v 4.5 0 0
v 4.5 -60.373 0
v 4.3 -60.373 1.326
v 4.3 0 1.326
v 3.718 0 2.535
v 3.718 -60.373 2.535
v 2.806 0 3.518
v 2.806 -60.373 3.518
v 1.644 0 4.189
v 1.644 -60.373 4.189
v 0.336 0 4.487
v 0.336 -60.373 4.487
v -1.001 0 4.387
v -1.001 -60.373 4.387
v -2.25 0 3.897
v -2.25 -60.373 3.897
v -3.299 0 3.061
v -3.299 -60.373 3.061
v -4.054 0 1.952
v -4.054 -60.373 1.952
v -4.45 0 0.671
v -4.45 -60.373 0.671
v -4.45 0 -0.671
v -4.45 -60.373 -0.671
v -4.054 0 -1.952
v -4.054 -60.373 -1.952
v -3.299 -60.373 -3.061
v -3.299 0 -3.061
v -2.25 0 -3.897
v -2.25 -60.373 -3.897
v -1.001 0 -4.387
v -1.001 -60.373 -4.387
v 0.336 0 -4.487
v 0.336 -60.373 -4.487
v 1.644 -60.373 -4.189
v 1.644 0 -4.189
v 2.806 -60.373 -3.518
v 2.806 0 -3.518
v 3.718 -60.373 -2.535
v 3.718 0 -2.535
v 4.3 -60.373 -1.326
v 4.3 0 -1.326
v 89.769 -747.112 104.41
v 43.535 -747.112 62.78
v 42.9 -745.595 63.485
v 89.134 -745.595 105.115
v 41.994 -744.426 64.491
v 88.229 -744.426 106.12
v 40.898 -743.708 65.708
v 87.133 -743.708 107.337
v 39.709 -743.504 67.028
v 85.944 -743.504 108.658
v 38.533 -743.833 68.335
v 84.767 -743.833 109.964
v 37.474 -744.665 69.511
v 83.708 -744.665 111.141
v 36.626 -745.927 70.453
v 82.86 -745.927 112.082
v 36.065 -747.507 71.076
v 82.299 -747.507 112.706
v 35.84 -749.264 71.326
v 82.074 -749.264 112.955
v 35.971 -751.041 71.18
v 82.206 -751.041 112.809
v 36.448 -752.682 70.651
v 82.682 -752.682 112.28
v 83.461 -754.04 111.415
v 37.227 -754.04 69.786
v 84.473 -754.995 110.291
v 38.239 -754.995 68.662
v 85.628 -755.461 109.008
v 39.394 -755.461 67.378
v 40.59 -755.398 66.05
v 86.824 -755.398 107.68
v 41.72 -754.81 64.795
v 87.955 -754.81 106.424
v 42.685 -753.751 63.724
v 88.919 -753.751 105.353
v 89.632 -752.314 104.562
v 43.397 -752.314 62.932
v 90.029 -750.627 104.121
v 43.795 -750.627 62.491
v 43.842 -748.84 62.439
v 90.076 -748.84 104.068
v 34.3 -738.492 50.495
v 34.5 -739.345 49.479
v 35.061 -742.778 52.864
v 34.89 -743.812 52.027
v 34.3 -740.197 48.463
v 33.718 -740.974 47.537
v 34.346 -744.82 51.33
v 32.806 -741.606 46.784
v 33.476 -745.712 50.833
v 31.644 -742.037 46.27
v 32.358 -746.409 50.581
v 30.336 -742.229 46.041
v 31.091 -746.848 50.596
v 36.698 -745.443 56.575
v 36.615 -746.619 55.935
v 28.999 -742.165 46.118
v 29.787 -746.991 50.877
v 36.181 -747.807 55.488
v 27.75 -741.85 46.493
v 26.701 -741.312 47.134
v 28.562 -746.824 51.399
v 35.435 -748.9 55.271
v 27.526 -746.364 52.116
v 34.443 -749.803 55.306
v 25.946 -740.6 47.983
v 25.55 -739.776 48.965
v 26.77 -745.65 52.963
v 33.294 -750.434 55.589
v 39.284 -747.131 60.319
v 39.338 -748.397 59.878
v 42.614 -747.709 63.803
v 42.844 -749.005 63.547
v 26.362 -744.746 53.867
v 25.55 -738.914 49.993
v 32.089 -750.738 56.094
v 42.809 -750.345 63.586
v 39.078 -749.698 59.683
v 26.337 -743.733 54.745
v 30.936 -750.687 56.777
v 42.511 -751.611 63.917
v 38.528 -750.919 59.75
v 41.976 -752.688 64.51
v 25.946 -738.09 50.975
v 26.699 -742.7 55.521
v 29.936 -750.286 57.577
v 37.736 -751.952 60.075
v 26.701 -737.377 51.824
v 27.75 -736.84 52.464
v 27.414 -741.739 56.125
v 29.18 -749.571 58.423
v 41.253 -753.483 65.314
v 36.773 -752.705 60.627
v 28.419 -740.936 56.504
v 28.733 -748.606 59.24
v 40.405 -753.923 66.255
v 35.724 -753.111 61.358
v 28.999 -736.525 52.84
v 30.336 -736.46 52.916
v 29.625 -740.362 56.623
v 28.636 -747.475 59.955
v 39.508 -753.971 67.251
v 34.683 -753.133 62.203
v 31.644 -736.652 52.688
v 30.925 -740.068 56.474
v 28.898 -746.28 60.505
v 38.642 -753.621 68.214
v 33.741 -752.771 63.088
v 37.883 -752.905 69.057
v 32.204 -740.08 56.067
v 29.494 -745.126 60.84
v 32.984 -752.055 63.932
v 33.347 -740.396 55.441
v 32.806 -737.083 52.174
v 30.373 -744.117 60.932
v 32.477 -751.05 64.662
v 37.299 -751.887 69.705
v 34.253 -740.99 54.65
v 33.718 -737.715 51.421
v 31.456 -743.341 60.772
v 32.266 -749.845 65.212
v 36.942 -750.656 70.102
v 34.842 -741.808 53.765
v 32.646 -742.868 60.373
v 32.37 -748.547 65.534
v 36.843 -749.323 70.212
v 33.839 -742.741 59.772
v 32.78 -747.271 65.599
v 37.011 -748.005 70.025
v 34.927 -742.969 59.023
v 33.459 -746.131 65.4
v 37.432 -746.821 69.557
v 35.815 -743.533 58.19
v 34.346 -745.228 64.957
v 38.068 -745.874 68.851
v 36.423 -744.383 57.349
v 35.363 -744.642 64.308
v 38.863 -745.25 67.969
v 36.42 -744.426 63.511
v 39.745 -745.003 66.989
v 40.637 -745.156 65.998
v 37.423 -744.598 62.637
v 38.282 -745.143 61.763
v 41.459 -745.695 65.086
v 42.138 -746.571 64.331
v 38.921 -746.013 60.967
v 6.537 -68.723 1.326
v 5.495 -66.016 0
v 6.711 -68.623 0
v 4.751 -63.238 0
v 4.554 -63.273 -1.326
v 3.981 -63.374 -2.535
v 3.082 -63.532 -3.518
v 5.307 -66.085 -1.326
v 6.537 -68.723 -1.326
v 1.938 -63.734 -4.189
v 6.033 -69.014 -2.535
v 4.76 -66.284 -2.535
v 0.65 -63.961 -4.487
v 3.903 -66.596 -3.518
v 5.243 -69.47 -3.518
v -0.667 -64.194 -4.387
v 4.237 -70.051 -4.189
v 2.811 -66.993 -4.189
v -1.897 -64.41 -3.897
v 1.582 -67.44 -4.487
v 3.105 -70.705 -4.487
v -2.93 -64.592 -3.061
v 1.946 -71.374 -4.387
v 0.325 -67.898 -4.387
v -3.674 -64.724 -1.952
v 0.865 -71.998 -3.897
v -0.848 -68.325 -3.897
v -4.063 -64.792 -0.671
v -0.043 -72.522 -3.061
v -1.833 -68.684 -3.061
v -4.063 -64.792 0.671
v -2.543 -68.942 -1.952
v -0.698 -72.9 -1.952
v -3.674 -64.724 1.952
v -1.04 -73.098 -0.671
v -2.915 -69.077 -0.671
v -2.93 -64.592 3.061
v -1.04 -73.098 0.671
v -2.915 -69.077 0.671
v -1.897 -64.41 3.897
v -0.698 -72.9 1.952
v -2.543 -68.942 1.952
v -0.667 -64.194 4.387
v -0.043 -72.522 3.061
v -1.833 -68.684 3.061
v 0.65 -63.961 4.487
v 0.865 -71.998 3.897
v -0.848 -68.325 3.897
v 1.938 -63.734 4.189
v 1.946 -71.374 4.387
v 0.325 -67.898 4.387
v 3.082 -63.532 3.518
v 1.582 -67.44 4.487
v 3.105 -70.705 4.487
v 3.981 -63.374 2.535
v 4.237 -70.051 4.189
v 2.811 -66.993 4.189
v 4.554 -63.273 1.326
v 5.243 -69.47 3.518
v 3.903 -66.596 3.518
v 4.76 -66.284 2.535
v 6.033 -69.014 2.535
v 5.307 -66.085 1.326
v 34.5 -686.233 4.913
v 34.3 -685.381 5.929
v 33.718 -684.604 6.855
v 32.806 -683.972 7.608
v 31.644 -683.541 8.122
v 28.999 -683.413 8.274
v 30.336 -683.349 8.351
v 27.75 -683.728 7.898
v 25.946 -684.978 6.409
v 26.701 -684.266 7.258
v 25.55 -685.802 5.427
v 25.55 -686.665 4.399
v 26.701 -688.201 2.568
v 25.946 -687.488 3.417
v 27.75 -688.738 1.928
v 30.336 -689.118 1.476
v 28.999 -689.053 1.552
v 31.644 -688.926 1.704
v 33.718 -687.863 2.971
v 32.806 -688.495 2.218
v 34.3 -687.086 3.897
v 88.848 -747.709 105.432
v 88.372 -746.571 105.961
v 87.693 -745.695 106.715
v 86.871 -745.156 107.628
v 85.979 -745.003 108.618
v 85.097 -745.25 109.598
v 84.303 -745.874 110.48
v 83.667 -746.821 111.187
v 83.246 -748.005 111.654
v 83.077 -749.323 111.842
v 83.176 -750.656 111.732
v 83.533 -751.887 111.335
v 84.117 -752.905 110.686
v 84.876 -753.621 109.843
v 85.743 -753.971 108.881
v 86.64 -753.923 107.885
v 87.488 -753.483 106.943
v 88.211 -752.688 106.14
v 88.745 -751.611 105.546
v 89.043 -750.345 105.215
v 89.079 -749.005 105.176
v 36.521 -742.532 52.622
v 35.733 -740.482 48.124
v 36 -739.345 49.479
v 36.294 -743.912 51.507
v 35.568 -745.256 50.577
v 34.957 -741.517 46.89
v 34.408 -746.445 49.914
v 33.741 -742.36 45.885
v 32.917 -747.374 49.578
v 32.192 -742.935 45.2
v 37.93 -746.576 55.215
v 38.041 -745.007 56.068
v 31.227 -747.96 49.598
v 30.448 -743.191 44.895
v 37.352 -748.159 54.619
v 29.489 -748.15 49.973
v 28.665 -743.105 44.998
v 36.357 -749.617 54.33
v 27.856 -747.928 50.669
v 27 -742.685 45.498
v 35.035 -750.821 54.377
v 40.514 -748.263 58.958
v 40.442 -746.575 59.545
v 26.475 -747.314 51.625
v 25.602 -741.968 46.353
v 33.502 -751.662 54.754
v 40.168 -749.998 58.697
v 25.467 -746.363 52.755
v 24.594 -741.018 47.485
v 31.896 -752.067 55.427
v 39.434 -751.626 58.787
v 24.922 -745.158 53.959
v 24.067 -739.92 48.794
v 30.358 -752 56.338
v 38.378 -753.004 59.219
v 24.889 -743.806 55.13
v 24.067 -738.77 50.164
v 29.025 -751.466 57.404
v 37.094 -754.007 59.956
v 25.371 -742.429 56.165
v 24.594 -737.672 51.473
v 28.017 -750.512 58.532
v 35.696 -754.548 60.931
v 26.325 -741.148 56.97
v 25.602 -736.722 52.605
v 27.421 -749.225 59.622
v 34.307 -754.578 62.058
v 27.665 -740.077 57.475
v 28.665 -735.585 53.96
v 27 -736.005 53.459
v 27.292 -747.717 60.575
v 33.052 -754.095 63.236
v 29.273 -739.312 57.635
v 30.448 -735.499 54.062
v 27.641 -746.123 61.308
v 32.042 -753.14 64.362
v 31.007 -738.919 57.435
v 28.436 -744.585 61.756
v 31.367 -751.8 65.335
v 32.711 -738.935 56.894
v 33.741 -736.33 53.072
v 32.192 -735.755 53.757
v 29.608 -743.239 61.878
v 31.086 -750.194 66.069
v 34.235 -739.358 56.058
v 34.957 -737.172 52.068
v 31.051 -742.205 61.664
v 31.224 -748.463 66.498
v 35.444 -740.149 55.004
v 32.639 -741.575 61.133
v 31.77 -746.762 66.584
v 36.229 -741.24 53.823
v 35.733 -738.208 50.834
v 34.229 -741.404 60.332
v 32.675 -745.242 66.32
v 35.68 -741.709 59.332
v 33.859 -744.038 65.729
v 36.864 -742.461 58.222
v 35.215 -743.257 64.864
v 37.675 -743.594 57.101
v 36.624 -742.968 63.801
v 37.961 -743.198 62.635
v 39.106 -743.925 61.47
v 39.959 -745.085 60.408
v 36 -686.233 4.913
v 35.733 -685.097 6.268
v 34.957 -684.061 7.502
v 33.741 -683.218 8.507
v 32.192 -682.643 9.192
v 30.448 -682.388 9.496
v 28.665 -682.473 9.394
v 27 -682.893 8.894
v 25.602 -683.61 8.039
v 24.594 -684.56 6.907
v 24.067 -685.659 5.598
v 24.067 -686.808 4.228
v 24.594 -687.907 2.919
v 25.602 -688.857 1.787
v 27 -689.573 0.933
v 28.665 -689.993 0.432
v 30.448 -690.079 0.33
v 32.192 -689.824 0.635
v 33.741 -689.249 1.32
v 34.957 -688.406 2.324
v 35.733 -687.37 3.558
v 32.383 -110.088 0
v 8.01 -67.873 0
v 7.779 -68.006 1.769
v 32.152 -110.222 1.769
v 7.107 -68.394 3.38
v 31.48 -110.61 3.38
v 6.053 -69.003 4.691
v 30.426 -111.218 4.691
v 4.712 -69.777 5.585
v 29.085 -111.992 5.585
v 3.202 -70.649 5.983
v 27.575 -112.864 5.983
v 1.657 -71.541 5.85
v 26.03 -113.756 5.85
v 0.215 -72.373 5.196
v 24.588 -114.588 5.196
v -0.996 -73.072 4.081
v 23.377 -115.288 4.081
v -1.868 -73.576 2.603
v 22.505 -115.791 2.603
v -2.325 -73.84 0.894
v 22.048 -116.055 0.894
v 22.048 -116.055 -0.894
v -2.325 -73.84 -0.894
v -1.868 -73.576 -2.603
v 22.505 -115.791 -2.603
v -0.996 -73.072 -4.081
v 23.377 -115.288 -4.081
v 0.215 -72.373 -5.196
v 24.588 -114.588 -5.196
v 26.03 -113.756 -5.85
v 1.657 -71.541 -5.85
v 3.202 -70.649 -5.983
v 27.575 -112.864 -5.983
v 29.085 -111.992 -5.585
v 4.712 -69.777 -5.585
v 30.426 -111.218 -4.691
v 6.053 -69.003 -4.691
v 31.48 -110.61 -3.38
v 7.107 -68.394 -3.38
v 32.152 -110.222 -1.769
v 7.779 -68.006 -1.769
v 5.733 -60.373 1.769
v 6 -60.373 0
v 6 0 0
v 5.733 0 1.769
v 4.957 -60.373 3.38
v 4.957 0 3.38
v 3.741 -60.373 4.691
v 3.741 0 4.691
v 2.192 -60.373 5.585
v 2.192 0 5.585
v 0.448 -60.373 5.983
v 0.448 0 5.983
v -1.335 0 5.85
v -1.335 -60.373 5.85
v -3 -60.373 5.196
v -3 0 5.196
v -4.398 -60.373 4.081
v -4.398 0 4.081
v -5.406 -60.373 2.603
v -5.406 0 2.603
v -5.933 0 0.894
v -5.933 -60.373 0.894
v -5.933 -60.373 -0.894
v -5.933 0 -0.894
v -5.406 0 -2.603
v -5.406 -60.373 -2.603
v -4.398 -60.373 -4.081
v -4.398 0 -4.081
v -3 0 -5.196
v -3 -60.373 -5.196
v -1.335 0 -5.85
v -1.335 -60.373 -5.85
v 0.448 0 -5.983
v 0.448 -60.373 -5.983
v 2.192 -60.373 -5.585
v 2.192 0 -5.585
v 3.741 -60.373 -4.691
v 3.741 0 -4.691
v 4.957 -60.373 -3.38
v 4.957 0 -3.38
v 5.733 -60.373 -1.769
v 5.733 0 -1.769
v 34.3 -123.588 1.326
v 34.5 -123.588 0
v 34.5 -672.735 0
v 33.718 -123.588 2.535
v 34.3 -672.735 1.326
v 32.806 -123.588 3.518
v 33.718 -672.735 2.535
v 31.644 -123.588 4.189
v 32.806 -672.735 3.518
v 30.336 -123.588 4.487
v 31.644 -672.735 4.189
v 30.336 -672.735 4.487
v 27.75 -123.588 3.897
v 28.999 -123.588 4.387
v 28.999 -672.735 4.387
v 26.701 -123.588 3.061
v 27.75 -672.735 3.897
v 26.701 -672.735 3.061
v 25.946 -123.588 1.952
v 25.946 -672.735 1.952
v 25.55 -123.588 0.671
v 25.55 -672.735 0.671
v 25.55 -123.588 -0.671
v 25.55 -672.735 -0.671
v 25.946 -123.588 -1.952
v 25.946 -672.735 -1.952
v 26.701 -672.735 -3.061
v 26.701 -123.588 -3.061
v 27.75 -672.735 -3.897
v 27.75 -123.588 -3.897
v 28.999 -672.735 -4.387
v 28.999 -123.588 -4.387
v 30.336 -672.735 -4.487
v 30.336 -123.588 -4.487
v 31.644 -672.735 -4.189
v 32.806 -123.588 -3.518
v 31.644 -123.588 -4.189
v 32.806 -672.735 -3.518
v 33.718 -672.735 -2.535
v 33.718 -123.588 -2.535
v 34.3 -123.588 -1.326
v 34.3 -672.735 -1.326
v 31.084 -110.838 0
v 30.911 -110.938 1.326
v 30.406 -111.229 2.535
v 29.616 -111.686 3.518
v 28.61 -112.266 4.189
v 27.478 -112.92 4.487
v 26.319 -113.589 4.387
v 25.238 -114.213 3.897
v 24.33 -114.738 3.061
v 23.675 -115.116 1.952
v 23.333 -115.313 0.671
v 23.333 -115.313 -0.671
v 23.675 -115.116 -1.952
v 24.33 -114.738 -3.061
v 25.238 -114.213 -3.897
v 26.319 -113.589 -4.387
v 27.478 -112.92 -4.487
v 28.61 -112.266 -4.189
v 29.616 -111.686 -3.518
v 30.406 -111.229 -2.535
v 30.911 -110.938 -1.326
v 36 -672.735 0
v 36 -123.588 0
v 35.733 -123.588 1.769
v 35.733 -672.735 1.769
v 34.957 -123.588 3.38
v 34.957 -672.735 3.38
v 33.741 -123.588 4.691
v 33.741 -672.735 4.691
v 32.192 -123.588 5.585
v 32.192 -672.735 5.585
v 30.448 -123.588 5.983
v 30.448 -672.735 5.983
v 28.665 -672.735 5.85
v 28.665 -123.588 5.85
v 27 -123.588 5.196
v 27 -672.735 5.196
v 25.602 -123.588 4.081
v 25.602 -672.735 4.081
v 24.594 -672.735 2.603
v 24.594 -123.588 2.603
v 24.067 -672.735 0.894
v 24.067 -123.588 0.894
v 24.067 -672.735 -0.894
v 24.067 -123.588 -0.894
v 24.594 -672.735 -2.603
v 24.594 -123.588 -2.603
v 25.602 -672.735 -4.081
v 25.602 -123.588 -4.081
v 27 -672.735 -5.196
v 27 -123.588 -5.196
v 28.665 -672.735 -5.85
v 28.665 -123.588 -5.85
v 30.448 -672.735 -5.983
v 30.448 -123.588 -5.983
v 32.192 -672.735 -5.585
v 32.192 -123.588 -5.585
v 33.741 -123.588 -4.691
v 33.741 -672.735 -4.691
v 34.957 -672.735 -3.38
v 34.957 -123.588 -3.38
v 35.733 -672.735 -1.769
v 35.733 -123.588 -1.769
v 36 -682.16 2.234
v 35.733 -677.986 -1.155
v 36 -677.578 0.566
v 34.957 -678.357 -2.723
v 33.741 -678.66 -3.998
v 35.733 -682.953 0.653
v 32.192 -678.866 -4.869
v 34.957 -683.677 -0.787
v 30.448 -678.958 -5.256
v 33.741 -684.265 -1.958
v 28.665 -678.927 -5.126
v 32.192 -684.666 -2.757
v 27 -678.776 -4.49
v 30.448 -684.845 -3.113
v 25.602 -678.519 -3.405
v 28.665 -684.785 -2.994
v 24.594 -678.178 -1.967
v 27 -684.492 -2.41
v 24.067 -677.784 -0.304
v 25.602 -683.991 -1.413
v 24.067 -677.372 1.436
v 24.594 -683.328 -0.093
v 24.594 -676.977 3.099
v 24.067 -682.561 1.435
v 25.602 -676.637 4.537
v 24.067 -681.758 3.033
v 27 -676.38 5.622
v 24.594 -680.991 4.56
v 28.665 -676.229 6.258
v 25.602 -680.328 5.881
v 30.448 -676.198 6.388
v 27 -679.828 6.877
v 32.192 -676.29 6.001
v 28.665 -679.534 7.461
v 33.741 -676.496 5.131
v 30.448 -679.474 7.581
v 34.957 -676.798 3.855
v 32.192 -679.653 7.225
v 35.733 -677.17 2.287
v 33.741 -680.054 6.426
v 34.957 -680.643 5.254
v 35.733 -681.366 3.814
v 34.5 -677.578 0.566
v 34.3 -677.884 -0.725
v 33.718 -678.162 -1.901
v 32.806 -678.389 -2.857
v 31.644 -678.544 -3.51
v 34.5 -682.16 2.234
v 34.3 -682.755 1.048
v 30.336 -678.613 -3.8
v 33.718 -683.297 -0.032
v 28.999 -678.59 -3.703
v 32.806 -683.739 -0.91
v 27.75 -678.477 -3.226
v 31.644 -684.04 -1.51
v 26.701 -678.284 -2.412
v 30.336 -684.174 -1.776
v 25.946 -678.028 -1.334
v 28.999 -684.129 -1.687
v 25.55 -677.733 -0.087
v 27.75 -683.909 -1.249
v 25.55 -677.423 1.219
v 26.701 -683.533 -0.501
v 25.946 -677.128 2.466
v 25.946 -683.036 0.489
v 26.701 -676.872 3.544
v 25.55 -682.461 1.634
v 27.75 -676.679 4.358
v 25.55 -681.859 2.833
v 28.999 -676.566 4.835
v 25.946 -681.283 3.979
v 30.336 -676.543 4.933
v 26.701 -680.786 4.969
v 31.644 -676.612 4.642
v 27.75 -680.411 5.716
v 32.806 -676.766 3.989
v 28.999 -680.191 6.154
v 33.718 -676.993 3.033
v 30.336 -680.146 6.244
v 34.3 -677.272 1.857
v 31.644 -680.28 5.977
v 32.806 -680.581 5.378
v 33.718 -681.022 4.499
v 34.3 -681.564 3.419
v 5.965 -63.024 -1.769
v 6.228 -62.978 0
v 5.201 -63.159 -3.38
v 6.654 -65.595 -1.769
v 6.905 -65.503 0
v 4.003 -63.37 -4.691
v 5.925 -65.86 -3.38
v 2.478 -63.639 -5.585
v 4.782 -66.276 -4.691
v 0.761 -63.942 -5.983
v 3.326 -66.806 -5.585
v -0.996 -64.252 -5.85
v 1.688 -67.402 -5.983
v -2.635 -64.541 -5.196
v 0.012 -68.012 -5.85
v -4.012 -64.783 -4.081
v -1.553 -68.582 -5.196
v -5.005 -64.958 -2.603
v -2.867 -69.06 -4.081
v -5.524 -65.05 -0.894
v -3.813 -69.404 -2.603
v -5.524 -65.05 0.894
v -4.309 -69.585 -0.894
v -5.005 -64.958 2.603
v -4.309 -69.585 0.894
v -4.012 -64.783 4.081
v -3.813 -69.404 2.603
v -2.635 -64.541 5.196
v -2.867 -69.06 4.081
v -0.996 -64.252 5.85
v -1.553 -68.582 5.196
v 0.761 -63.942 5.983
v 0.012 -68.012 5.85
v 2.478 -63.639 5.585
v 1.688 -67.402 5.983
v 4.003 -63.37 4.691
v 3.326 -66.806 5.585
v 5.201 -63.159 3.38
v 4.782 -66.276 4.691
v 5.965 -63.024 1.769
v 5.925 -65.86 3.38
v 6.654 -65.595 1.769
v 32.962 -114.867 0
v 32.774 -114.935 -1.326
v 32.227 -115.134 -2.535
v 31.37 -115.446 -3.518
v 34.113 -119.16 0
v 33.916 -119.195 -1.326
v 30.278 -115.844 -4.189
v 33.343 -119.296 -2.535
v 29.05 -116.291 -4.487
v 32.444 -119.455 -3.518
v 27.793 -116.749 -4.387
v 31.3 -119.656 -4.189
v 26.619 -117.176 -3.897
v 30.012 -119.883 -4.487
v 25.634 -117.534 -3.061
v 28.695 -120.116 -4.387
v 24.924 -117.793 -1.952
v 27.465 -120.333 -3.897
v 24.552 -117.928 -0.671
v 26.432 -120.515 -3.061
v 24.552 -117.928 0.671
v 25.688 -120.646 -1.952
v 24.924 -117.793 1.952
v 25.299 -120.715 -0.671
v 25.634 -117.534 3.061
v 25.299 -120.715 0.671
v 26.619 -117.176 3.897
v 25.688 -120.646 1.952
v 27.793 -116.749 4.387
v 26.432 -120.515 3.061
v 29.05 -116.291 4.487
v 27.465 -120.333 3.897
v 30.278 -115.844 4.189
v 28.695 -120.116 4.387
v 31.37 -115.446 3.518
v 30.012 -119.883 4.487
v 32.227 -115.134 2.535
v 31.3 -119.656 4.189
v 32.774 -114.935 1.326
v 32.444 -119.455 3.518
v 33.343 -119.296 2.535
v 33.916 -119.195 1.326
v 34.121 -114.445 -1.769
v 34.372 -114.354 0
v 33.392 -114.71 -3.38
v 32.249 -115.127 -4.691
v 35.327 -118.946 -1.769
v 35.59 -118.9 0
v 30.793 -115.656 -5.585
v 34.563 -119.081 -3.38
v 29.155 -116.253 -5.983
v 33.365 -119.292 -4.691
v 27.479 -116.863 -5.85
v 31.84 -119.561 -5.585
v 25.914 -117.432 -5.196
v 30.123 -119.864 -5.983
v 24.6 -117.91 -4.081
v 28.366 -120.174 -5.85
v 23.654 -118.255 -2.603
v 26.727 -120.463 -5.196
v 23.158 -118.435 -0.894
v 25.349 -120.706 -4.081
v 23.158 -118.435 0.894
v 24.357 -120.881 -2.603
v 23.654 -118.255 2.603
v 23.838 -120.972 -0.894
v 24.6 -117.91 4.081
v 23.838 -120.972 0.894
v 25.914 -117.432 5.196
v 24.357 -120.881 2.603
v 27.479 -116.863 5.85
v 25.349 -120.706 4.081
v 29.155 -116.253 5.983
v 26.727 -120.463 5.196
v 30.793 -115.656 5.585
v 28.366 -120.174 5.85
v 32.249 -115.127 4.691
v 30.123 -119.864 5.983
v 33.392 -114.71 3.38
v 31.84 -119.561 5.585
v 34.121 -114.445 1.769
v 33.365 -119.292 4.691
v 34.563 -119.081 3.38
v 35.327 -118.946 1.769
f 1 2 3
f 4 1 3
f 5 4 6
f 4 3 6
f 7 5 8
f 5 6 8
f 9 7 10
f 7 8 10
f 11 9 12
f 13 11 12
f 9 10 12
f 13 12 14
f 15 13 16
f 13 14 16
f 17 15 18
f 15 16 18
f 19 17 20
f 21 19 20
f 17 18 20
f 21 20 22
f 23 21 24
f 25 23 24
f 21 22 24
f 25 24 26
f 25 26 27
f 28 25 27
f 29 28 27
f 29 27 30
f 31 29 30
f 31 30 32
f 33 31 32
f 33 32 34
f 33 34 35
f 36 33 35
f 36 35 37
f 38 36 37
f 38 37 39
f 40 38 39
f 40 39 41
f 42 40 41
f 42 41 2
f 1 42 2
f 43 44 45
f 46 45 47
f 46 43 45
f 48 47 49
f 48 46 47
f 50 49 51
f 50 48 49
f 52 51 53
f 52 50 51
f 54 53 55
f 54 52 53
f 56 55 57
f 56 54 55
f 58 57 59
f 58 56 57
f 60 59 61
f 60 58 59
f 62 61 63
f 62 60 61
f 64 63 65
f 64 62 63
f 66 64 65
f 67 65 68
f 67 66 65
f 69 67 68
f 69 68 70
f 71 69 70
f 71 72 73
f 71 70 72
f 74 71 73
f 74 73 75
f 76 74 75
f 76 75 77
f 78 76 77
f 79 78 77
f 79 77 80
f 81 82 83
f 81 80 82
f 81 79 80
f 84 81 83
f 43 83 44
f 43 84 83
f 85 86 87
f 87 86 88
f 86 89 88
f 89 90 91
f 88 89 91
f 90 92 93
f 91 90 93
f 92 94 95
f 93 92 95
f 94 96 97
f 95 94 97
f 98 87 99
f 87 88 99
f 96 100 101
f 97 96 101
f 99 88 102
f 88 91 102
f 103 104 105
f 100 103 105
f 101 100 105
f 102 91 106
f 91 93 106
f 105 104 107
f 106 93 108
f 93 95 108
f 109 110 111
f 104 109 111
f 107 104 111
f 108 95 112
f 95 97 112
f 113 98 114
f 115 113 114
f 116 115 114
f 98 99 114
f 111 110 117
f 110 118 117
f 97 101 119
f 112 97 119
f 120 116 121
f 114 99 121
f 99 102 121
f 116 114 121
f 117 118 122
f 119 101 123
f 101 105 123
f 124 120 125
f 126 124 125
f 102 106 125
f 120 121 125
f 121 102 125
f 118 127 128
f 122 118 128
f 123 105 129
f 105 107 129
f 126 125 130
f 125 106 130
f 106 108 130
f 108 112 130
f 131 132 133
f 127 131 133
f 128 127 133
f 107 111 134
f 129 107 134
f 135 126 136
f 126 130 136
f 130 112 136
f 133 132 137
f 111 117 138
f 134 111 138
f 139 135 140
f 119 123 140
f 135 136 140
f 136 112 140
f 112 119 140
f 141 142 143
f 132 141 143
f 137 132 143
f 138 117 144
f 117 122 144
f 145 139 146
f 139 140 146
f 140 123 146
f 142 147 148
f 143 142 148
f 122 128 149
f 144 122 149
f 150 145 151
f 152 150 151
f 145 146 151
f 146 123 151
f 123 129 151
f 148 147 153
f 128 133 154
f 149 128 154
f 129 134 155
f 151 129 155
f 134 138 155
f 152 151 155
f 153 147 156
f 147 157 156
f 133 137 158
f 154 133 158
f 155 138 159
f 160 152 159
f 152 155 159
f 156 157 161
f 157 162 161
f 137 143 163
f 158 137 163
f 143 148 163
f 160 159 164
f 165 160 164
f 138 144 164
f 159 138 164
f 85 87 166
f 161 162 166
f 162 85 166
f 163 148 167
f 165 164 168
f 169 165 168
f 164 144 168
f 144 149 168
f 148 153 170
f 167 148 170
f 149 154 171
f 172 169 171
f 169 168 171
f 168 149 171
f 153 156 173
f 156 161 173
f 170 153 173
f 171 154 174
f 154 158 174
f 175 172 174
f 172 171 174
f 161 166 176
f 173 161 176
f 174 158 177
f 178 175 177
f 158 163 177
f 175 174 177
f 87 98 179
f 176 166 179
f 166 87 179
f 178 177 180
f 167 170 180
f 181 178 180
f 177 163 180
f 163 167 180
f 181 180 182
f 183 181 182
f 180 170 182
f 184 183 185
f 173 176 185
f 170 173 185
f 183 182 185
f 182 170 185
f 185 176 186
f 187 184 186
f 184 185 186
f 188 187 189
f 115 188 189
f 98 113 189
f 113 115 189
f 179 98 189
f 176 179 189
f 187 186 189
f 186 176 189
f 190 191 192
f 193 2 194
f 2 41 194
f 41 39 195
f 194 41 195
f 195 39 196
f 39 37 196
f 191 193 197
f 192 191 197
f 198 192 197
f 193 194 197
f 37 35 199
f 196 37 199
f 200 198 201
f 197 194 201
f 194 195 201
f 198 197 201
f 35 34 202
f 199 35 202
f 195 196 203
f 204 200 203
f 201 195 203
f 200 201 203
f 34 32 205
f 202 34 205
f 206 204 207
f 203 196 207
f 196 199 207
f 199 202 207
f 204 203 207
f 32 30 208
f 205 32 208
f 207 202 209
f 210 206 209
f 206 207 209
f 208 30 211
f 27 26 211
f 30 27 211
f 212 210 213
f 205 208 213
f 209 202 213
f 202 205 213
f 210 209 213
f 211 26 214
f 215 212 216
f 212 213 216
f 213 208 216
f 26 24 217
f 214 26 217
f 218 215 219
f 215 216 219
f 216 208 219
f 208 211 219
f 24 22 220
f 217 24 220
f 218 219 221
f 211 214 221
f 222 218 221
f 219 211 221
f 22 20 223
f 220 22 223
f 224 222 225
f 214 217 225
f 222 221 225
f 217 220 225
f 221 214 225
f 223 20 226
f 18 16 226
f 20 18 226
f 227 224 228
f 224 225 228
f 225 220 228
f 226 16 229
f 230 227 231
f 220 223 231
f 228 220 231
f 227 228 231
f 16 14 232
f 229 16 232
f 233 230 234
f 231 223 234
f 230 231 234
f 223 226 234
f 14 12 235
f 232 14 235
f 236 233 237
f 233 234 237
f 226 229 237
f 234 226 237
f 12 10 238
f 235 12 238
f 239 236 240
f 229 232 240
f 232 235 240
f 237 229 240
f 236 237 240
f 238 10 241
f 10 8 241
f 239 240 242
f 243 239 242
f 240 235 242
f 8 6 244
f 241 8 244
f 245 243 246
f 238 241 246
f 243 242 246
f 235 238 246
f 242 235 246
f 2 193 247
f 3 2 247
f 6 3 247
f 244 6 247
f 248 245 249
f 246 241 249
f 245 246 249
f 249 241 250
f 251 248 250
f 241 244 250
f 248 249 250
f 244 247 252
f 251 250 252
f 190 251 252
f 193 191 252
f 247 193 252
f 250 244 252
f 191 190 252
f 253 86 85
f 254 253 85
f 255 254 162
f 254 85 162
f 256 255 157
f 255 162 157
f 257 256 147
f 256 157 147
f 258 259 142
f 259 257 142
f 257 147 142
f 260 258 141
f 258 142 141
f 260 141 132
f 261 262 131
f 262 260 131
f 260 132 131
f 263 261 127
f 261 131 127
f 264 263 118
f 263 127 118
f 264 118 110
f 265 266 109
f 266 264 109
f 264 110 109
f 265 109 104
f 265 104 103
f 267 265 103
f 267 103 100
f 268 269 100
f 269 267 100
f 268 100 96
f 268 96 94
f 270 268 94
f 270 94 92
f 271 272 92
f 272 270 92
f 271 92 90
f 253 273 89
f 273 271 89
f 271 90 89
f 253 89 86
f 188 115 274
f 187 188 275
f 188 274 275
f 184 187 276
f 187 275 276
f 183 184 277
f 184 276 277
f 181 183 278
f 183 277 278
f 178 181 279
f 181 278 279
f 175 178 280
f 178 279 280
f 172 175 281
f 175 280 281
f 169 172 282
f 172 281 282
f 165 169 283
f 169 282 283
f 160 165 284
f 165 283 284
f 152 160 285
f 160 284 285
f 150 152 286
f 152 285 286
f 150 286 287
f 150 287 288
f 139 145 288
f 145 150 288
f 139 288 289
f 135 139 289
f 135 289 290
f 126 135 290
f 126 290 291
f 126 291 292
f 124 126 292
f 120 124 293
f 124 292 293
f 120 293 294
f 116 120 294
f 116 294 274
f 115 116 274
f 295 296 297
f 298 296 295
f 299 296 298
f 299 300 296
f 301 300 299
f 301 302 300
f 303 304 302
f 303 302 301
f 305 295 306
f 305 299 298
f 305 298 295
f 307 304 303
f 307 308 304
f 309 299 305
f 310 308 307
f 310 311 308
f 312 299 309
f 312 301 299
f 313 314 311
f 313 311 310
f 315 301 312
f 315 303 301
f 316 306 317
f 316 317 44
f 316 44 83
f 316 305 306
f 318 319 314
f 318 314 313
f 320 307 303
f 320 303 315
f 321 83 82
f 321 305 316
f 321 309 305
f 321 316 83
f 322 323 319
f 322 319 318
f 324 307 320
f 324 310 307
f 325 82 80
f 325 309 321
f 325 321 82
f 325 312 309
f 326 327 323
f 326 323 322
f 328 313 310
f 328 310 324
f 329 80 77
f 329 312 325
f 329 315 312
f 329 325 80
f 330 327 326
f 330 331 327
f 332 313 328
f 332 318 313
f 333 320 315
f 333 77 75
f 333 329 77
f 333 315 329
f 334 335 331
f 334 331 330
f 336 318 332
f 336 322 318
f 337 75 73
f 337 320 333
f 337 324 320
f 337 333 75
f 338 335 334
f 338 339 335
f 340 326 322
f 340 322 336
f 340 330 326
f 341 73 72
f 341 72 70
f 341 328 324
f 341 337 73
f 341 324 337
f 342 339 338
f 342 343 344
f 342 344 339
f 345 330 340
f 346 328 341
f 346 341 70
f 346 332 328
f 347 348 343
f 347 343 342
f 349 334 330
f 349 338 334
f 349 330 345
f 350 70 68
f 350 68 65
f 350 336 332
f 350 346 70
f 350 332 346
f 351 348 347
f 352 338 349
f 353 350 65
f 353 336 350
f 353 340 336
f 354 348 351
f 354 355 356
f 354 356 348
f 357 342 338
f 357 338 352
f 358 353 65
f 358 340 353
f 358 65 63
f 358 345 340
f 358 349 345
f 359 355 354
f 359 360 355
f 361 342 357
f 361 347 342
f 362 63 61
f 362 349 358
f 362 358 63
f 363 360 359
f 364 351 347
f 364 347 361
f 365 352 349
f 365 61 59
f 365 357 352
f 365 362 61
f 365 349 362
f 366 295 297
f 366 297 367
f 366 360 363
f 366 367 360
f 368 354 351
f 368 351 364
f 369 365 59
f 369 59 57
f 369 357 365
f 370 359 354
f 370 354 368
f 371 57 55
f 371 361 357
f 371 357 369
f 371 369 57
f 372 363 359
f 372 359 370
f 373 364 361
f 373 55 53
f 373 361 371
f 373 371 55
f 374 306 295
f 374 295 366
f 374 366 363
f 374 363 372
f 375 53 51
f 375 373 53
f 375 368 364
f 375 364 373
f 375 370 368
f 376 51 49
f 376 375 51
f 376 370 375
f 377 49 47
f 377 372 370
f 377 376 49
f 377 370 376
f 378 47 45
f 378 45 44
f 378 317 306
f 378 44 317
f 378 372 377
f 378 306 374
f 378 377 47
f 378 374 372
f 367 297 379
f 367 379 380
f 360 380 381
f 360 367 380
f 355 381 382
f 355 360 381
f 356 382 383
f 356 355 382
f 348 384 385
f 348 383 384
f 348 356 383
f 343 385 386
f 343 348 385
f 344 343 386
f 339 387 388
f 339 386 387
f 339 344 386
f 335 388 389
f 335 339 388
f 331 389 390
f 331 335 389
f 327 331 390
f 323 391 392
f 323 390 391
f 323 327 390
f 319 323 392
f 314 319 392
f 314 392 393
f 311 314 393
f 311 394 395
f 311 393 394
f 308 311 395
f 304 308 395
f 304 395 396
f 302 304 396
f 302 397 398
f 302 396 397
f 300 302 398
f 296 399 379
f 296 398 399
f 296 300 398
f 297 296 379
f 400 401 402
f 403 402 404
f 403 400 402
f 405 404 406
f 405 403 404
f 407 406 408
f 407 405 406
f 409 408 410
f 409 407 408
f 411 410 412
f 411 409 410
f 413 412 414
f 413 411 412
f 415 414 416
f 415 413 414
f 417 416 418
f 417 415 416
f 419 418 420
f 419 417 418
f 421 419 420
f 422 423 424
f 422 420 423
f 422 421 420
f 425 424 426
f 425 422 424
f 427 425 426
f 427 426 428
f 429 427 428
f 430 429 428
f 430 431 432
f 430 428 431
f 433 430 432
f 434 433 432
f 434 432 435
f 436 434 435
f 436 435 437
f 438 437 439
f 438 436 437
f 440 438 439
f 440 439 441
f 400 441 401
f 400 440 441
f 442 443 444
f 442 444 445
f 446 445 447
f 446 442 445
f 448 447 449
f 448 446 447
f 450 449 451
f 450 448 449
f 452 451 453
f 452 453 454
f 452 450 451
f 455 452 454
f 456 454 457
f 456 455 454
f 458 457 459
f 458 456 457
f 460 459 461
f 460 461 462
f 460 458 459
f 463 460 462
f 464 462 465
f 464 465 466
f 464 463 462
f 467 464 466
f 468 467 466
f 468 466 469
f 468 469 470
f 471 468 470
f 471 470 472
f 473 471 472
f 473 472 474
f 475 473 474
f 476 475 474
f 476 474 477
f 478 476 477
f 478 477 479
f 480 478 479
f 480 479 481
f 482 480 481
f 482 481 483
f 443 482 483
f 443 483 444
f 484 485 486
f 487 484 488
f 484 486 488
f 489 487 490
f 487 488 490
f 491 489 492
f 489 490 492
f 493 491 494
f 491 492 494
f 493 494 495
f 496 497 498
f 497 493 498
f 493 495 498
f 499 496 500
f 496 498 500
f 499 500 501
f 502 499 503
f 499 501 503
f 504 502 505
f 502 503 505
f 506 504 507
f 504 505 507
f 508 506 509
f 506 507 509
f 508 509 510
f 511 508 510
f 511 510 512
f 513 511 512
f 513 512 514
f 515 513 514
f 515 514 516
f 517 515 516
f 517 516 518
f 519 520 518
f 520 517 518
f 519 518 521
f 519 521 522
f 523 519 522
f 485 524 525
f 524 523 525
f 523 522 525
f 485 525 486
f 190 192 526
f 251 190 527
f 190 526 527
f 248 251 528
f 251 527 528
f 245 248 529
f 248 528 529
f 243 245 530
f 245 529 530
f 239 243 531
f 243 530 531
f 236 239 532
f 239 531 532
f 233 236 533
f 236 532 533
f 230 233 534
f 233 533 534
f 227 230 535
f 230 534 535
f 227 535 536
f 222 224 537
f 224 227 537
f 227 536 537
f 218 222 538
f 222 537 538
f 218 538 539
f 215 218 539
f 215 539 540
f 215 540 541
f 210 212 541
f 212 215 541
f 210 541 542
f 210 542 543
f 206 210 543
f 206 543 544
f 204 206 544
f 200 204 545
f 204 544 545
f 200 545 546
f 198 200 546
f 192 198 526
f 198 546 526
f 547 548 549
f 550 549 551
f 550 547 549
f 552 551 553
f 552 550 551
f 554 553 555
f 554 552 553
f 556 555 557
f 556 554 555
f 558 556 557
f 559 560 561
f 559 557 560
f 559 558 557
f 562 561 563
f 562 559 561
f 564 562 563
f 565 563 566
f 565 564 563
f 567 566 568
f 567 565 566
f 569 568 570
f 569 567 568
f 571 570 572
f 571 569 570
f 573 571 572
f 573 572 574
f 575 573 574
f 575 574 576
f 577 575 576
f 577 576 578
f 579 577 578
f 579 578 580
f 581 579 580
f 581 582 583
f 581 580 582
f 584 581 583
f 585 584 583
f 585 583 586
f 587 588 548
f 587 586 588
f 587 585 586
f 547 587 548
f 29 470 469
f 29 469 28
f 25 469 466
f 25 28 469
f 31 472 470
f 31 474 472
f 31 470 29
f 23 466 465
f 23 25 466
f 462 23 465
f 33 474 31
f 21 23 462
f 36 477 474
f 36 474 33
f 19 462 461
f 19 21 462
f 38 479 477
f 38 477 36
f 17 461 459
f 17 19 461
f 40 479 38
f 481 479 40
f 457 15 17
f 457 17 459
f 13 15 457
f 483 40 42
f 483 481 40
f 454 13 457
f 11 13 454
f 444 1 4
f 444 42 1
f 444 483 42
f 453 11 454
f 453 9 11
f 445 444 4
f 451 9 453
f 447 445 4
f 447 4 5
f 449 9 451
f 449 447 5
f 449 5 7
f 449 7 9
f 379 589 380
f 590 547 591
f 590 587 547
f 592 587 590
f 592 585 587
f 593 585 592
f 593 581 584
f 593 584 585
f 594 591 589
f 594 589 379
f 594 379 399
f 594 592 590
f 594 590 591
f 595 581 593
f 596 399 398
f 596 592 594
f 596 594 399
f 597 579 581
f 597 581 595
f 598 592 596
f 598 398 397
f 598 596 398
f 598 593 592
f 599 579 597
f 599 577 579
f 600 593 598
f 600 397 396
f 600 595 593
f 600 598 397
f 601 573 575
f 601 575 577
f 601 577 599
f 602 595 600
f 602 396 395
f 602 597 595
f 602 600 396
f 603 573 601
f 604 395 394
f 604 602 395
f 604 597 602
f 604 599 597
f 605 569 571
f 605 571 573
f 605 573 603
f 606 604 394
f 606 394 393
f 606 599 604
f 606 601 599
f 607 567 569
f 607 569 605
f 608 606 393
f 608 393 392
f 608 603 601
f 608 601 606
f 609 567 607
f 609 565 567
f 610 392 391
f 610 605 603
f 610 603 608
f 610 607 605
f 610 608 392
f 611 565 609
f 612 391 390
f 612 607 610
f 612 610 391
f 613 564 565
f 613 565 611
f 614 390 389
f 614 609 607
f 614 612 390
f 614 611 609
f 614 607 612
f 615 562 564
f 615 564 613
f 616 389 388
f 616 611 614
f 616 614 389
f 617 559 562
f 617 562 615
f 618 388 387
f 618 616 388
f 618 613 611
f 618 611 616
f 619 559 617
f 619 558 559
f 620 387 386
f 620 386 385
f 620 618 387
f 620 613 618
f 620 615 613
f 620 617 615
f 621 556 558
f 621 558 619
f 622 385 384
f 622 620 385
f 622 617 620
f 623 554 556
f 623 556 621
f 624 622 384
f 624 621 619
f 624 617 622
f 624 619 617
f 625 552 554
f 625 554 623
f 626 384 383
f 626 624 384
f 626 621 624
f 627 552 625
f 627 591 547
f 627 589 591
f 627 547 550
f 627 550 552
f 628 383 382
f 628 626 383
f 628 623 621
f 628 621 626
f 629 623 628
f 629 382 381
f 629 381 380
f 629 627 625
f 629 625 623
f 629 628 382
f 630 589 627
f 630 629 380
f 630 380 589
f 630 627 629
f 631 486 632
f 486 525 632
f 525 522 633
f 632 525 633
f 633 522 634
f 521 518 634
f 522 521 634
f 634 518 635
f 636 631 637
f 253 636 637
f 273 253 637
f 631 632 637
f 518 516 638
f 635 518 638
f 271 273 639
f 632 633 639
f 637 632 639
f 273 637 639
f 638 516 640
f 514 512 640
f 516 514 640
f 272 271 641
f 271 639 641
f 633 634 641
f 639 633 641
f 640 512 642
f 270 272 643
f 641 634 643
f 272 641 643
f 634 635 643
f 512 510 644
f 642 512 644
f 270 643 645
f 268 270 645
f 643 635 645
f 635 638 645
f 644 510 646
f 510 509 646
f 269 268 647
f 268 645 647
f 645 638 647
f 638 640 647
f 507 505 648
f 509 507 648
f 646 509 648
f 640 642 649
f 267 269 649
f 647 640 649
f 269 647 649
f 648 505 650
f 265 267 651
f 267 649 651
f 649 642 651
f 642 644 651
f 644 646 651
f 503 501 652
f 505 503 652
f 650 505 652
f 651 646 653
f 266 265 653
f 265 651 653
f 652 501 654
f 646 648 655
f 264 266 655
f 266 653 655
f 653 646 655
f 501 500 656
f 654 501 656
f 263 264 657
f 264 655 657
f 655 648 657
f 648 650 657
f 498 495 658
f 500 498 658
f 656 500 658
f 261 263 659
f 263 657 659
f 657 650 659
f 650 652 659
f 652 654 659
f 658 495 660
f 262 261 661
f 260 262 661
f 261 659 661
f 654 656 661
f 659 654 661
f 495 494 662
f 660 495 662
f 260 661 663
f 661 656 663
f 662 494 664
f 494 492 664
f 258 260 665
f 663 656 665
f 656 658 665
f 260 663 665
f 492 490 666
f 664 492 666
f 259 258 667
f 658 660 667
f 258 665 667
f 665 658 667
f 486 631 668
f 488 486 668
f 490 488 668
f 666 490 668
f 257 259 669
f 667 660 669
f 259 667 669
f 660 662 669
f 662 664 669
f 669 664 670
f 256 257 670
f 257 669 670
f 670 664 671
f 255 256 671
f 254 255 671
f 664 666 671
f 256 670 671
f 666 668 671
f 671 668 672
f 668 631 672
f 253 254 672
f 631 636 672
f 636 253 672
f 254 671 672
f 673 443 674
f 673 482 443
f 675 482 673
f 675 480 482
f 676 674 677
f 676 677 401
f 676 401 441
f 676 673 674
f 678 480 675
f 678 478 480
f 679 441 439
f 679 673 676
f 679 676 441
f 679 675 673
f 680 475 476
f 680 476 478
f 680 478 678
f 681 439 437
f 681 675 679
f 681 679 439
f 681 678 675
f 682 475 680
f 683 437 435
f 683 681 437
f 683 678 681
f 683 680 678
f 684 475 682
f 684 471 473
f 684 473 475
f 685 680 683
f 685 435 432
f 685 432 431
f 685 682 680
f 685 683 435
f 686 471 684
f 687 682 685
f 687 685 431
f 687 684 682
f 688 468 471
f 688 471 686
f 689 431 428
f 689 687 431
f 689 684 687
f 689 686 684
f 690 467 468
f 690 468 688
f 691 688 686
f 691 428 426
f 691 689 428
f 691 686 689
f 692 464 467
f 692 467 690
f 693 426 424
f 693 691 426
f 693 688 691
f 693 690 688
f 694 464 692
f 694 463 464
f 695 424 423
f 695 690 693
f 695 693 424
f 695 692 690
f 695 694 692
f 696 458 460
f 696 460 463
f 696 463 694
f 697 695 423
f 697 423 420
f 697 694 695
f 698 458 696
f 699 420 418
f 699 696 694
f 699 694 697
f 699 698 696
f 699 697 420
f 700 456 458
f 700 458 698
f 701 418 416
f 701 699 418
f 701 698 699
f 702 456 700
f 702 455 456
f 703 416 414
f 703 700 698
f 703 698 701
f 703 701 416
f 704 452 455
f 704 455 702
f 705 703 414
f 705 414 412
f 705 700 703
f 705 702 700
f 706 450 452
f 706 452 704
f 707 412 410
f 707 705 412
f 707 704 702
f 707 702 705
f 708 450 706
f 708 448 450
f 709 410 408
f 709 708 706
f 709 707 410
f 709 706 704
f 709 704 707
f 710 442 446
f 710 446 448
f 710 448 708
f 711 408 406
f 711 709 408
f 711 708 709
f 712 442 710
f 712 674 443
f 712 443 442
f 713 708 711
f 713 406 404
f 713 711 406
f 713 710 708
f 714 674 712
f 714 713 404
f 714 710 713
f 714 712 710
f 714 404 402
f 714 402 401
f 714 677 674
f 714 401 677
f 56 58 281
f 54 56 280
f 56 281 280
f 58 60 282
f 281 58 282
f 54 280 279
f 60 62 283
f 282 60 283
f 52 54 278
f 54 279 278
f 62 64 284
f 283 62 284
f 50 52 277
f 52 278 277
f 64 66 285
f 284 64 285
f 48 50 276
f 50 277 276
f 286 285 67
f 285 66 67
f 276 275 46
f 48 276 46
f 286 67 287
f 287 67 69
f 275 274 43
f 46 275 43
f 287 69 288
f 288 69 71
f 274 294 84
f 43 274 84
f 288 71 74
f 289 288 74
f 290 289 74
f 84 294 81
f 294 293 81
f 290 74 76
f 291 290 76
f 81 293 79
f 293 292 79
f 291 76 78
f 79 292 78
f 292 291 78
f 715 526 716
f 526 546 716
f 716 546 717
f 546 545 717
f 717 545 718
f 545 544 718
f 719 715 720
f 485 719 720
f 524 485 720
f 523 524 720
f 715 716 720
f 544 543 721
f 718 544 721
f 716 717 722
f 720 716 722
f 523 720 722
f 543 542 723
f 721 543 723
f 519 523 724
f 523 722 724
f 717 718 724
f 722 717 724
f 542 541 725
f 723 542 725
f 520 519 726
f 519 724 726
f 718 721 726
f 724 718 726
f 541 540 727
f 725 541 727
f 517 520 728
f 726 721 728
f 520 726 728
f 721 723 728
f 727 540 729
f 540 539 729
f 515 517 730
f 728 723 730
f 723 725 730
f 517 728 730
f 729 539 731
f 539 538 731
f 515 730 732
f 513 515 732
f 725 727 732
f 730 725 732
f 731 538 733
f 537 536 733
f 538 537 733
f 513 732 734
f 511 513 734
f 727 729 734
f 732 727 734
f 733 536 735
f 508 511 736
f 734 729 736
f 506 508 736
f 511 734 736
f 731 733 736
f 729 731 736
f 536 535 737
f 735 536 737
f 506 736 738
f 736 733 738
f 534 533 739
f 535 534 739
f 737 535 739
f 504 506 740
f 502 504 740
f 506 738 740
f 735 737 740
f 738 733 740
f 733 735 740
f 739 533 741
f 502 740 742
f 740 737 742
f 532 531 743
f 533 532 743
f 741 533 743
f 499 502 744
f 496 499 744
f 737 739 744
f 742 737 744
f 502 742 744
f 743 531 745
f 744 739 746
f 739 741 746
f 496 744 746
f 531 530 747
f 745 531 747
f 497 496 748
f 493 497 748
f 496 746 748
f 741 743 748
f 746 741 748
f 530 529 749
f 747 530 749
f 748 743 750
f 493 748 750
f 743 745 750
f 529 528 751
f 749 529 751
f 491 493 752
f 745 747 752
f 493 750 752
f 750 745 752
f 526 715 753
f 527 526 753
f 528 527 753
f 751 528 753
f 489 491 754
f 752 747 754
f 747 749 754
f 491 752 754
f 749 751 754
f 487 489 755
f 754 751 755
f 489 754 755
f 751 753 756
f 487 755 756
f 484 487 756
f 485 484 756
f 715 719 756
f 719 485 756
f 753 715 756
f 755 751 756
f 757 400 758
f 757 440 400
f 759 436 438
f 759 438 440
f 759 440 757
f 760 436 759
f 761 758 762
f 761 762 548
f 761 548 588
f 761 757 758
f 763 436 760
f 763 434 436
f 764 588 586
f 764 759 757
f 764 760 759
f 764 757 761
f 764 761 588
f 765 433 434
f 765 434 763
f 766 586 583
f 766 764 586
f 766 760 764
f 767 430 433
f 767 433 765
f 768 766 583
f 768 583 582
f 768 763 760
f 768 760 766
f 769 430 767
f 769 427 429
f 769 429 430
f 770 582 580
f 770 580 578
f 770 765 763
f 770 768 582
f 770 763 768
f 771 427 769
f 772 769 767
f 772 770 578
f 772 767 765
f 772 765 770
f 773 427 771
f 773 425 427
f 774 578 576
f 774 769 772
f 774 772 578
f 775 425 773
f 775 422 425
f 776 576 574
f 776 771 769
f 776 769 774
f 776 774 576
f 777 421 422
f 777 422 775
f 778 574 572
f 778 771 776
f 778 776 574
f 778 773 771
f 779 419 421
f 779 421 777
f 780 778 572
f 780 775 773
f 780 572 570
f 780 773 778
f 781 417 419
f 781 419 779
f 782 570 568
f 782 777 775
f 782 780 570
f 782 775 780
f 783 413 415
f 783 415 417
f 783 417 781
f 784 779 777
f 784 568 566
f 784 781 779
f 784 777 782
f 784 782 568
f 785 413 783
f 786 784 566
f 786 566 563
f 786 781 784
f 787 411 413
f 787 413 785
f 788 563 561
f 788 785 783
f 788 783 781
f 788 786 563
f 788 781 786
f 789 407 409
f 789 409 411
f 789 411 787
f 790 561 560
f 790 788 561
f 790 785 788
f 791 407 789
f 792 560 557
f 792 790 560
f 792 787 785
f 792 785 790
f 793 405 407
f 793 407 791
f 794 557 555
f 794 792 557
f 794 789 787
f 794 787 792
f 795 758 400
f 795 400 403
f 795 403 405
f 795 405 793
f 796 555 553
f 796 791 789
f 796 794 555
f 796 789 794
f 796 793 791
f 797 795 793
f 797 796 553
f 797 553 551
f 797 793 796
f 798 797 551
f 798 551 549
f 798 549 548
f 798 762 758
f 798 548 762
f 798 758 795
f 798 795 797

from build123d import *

# Parameters (mm, degrees)
SKETCH2_R   = 6
SKETCH2_R_2 = 4.5


with BuildPart() as part:
    # Sweep1: sweep along a curve in space
    with BuildLine() as sweep1_path:
        Line((0, 0, 0), (0, -60.373066959, 0))
        ThreePointArc((0, -60.373066959, 0), (0.715557648, -65.808266906, 0), (2.813466521, -70.873066959, 0))
        Line((2.813466521, -70.873066959, 0), (27.186533479, -113.088457268, 0))
        ThreePointArc((27.186533479, -113.088457268, 0), (29.284442352, -118.153257321, 0), (30, -123.588457268, 0))
        Line((30, -123.588457268, 0), (30, -672.73491671, 0))
        ThreePointArc((30, -672.73491671, 0), (30, -679.91733972, 1.266454963), (30, -686.233456513, 4.913066695))
        Line((30, -686.233456513, 4.913066695), (30, -739.344889262, 49.478850325))
        ThreePointArc((30, -739.344889262, 49.478850325), (32.668913393, -746.748845442, 58.094607638), (39.851540684, -749.5, 66.870367075))
        Line((39.851540684, -749.5, 66.870367075), (86.085931999, -749.5, 108.5))
    # Sketch2 → Sweep1 (sweep)
    with BuildSketch(Plane(origin=(0, 0, 0), x_dir=(1, 0, 0), z_dir=(0, 1, 0))):
        Circle(SKETCH2_R)
        Circle(SKETCH2_R_2, mode=Mode.SUBTRACT)
    sweep(path=sweep1_path.line)


solid = part.part
